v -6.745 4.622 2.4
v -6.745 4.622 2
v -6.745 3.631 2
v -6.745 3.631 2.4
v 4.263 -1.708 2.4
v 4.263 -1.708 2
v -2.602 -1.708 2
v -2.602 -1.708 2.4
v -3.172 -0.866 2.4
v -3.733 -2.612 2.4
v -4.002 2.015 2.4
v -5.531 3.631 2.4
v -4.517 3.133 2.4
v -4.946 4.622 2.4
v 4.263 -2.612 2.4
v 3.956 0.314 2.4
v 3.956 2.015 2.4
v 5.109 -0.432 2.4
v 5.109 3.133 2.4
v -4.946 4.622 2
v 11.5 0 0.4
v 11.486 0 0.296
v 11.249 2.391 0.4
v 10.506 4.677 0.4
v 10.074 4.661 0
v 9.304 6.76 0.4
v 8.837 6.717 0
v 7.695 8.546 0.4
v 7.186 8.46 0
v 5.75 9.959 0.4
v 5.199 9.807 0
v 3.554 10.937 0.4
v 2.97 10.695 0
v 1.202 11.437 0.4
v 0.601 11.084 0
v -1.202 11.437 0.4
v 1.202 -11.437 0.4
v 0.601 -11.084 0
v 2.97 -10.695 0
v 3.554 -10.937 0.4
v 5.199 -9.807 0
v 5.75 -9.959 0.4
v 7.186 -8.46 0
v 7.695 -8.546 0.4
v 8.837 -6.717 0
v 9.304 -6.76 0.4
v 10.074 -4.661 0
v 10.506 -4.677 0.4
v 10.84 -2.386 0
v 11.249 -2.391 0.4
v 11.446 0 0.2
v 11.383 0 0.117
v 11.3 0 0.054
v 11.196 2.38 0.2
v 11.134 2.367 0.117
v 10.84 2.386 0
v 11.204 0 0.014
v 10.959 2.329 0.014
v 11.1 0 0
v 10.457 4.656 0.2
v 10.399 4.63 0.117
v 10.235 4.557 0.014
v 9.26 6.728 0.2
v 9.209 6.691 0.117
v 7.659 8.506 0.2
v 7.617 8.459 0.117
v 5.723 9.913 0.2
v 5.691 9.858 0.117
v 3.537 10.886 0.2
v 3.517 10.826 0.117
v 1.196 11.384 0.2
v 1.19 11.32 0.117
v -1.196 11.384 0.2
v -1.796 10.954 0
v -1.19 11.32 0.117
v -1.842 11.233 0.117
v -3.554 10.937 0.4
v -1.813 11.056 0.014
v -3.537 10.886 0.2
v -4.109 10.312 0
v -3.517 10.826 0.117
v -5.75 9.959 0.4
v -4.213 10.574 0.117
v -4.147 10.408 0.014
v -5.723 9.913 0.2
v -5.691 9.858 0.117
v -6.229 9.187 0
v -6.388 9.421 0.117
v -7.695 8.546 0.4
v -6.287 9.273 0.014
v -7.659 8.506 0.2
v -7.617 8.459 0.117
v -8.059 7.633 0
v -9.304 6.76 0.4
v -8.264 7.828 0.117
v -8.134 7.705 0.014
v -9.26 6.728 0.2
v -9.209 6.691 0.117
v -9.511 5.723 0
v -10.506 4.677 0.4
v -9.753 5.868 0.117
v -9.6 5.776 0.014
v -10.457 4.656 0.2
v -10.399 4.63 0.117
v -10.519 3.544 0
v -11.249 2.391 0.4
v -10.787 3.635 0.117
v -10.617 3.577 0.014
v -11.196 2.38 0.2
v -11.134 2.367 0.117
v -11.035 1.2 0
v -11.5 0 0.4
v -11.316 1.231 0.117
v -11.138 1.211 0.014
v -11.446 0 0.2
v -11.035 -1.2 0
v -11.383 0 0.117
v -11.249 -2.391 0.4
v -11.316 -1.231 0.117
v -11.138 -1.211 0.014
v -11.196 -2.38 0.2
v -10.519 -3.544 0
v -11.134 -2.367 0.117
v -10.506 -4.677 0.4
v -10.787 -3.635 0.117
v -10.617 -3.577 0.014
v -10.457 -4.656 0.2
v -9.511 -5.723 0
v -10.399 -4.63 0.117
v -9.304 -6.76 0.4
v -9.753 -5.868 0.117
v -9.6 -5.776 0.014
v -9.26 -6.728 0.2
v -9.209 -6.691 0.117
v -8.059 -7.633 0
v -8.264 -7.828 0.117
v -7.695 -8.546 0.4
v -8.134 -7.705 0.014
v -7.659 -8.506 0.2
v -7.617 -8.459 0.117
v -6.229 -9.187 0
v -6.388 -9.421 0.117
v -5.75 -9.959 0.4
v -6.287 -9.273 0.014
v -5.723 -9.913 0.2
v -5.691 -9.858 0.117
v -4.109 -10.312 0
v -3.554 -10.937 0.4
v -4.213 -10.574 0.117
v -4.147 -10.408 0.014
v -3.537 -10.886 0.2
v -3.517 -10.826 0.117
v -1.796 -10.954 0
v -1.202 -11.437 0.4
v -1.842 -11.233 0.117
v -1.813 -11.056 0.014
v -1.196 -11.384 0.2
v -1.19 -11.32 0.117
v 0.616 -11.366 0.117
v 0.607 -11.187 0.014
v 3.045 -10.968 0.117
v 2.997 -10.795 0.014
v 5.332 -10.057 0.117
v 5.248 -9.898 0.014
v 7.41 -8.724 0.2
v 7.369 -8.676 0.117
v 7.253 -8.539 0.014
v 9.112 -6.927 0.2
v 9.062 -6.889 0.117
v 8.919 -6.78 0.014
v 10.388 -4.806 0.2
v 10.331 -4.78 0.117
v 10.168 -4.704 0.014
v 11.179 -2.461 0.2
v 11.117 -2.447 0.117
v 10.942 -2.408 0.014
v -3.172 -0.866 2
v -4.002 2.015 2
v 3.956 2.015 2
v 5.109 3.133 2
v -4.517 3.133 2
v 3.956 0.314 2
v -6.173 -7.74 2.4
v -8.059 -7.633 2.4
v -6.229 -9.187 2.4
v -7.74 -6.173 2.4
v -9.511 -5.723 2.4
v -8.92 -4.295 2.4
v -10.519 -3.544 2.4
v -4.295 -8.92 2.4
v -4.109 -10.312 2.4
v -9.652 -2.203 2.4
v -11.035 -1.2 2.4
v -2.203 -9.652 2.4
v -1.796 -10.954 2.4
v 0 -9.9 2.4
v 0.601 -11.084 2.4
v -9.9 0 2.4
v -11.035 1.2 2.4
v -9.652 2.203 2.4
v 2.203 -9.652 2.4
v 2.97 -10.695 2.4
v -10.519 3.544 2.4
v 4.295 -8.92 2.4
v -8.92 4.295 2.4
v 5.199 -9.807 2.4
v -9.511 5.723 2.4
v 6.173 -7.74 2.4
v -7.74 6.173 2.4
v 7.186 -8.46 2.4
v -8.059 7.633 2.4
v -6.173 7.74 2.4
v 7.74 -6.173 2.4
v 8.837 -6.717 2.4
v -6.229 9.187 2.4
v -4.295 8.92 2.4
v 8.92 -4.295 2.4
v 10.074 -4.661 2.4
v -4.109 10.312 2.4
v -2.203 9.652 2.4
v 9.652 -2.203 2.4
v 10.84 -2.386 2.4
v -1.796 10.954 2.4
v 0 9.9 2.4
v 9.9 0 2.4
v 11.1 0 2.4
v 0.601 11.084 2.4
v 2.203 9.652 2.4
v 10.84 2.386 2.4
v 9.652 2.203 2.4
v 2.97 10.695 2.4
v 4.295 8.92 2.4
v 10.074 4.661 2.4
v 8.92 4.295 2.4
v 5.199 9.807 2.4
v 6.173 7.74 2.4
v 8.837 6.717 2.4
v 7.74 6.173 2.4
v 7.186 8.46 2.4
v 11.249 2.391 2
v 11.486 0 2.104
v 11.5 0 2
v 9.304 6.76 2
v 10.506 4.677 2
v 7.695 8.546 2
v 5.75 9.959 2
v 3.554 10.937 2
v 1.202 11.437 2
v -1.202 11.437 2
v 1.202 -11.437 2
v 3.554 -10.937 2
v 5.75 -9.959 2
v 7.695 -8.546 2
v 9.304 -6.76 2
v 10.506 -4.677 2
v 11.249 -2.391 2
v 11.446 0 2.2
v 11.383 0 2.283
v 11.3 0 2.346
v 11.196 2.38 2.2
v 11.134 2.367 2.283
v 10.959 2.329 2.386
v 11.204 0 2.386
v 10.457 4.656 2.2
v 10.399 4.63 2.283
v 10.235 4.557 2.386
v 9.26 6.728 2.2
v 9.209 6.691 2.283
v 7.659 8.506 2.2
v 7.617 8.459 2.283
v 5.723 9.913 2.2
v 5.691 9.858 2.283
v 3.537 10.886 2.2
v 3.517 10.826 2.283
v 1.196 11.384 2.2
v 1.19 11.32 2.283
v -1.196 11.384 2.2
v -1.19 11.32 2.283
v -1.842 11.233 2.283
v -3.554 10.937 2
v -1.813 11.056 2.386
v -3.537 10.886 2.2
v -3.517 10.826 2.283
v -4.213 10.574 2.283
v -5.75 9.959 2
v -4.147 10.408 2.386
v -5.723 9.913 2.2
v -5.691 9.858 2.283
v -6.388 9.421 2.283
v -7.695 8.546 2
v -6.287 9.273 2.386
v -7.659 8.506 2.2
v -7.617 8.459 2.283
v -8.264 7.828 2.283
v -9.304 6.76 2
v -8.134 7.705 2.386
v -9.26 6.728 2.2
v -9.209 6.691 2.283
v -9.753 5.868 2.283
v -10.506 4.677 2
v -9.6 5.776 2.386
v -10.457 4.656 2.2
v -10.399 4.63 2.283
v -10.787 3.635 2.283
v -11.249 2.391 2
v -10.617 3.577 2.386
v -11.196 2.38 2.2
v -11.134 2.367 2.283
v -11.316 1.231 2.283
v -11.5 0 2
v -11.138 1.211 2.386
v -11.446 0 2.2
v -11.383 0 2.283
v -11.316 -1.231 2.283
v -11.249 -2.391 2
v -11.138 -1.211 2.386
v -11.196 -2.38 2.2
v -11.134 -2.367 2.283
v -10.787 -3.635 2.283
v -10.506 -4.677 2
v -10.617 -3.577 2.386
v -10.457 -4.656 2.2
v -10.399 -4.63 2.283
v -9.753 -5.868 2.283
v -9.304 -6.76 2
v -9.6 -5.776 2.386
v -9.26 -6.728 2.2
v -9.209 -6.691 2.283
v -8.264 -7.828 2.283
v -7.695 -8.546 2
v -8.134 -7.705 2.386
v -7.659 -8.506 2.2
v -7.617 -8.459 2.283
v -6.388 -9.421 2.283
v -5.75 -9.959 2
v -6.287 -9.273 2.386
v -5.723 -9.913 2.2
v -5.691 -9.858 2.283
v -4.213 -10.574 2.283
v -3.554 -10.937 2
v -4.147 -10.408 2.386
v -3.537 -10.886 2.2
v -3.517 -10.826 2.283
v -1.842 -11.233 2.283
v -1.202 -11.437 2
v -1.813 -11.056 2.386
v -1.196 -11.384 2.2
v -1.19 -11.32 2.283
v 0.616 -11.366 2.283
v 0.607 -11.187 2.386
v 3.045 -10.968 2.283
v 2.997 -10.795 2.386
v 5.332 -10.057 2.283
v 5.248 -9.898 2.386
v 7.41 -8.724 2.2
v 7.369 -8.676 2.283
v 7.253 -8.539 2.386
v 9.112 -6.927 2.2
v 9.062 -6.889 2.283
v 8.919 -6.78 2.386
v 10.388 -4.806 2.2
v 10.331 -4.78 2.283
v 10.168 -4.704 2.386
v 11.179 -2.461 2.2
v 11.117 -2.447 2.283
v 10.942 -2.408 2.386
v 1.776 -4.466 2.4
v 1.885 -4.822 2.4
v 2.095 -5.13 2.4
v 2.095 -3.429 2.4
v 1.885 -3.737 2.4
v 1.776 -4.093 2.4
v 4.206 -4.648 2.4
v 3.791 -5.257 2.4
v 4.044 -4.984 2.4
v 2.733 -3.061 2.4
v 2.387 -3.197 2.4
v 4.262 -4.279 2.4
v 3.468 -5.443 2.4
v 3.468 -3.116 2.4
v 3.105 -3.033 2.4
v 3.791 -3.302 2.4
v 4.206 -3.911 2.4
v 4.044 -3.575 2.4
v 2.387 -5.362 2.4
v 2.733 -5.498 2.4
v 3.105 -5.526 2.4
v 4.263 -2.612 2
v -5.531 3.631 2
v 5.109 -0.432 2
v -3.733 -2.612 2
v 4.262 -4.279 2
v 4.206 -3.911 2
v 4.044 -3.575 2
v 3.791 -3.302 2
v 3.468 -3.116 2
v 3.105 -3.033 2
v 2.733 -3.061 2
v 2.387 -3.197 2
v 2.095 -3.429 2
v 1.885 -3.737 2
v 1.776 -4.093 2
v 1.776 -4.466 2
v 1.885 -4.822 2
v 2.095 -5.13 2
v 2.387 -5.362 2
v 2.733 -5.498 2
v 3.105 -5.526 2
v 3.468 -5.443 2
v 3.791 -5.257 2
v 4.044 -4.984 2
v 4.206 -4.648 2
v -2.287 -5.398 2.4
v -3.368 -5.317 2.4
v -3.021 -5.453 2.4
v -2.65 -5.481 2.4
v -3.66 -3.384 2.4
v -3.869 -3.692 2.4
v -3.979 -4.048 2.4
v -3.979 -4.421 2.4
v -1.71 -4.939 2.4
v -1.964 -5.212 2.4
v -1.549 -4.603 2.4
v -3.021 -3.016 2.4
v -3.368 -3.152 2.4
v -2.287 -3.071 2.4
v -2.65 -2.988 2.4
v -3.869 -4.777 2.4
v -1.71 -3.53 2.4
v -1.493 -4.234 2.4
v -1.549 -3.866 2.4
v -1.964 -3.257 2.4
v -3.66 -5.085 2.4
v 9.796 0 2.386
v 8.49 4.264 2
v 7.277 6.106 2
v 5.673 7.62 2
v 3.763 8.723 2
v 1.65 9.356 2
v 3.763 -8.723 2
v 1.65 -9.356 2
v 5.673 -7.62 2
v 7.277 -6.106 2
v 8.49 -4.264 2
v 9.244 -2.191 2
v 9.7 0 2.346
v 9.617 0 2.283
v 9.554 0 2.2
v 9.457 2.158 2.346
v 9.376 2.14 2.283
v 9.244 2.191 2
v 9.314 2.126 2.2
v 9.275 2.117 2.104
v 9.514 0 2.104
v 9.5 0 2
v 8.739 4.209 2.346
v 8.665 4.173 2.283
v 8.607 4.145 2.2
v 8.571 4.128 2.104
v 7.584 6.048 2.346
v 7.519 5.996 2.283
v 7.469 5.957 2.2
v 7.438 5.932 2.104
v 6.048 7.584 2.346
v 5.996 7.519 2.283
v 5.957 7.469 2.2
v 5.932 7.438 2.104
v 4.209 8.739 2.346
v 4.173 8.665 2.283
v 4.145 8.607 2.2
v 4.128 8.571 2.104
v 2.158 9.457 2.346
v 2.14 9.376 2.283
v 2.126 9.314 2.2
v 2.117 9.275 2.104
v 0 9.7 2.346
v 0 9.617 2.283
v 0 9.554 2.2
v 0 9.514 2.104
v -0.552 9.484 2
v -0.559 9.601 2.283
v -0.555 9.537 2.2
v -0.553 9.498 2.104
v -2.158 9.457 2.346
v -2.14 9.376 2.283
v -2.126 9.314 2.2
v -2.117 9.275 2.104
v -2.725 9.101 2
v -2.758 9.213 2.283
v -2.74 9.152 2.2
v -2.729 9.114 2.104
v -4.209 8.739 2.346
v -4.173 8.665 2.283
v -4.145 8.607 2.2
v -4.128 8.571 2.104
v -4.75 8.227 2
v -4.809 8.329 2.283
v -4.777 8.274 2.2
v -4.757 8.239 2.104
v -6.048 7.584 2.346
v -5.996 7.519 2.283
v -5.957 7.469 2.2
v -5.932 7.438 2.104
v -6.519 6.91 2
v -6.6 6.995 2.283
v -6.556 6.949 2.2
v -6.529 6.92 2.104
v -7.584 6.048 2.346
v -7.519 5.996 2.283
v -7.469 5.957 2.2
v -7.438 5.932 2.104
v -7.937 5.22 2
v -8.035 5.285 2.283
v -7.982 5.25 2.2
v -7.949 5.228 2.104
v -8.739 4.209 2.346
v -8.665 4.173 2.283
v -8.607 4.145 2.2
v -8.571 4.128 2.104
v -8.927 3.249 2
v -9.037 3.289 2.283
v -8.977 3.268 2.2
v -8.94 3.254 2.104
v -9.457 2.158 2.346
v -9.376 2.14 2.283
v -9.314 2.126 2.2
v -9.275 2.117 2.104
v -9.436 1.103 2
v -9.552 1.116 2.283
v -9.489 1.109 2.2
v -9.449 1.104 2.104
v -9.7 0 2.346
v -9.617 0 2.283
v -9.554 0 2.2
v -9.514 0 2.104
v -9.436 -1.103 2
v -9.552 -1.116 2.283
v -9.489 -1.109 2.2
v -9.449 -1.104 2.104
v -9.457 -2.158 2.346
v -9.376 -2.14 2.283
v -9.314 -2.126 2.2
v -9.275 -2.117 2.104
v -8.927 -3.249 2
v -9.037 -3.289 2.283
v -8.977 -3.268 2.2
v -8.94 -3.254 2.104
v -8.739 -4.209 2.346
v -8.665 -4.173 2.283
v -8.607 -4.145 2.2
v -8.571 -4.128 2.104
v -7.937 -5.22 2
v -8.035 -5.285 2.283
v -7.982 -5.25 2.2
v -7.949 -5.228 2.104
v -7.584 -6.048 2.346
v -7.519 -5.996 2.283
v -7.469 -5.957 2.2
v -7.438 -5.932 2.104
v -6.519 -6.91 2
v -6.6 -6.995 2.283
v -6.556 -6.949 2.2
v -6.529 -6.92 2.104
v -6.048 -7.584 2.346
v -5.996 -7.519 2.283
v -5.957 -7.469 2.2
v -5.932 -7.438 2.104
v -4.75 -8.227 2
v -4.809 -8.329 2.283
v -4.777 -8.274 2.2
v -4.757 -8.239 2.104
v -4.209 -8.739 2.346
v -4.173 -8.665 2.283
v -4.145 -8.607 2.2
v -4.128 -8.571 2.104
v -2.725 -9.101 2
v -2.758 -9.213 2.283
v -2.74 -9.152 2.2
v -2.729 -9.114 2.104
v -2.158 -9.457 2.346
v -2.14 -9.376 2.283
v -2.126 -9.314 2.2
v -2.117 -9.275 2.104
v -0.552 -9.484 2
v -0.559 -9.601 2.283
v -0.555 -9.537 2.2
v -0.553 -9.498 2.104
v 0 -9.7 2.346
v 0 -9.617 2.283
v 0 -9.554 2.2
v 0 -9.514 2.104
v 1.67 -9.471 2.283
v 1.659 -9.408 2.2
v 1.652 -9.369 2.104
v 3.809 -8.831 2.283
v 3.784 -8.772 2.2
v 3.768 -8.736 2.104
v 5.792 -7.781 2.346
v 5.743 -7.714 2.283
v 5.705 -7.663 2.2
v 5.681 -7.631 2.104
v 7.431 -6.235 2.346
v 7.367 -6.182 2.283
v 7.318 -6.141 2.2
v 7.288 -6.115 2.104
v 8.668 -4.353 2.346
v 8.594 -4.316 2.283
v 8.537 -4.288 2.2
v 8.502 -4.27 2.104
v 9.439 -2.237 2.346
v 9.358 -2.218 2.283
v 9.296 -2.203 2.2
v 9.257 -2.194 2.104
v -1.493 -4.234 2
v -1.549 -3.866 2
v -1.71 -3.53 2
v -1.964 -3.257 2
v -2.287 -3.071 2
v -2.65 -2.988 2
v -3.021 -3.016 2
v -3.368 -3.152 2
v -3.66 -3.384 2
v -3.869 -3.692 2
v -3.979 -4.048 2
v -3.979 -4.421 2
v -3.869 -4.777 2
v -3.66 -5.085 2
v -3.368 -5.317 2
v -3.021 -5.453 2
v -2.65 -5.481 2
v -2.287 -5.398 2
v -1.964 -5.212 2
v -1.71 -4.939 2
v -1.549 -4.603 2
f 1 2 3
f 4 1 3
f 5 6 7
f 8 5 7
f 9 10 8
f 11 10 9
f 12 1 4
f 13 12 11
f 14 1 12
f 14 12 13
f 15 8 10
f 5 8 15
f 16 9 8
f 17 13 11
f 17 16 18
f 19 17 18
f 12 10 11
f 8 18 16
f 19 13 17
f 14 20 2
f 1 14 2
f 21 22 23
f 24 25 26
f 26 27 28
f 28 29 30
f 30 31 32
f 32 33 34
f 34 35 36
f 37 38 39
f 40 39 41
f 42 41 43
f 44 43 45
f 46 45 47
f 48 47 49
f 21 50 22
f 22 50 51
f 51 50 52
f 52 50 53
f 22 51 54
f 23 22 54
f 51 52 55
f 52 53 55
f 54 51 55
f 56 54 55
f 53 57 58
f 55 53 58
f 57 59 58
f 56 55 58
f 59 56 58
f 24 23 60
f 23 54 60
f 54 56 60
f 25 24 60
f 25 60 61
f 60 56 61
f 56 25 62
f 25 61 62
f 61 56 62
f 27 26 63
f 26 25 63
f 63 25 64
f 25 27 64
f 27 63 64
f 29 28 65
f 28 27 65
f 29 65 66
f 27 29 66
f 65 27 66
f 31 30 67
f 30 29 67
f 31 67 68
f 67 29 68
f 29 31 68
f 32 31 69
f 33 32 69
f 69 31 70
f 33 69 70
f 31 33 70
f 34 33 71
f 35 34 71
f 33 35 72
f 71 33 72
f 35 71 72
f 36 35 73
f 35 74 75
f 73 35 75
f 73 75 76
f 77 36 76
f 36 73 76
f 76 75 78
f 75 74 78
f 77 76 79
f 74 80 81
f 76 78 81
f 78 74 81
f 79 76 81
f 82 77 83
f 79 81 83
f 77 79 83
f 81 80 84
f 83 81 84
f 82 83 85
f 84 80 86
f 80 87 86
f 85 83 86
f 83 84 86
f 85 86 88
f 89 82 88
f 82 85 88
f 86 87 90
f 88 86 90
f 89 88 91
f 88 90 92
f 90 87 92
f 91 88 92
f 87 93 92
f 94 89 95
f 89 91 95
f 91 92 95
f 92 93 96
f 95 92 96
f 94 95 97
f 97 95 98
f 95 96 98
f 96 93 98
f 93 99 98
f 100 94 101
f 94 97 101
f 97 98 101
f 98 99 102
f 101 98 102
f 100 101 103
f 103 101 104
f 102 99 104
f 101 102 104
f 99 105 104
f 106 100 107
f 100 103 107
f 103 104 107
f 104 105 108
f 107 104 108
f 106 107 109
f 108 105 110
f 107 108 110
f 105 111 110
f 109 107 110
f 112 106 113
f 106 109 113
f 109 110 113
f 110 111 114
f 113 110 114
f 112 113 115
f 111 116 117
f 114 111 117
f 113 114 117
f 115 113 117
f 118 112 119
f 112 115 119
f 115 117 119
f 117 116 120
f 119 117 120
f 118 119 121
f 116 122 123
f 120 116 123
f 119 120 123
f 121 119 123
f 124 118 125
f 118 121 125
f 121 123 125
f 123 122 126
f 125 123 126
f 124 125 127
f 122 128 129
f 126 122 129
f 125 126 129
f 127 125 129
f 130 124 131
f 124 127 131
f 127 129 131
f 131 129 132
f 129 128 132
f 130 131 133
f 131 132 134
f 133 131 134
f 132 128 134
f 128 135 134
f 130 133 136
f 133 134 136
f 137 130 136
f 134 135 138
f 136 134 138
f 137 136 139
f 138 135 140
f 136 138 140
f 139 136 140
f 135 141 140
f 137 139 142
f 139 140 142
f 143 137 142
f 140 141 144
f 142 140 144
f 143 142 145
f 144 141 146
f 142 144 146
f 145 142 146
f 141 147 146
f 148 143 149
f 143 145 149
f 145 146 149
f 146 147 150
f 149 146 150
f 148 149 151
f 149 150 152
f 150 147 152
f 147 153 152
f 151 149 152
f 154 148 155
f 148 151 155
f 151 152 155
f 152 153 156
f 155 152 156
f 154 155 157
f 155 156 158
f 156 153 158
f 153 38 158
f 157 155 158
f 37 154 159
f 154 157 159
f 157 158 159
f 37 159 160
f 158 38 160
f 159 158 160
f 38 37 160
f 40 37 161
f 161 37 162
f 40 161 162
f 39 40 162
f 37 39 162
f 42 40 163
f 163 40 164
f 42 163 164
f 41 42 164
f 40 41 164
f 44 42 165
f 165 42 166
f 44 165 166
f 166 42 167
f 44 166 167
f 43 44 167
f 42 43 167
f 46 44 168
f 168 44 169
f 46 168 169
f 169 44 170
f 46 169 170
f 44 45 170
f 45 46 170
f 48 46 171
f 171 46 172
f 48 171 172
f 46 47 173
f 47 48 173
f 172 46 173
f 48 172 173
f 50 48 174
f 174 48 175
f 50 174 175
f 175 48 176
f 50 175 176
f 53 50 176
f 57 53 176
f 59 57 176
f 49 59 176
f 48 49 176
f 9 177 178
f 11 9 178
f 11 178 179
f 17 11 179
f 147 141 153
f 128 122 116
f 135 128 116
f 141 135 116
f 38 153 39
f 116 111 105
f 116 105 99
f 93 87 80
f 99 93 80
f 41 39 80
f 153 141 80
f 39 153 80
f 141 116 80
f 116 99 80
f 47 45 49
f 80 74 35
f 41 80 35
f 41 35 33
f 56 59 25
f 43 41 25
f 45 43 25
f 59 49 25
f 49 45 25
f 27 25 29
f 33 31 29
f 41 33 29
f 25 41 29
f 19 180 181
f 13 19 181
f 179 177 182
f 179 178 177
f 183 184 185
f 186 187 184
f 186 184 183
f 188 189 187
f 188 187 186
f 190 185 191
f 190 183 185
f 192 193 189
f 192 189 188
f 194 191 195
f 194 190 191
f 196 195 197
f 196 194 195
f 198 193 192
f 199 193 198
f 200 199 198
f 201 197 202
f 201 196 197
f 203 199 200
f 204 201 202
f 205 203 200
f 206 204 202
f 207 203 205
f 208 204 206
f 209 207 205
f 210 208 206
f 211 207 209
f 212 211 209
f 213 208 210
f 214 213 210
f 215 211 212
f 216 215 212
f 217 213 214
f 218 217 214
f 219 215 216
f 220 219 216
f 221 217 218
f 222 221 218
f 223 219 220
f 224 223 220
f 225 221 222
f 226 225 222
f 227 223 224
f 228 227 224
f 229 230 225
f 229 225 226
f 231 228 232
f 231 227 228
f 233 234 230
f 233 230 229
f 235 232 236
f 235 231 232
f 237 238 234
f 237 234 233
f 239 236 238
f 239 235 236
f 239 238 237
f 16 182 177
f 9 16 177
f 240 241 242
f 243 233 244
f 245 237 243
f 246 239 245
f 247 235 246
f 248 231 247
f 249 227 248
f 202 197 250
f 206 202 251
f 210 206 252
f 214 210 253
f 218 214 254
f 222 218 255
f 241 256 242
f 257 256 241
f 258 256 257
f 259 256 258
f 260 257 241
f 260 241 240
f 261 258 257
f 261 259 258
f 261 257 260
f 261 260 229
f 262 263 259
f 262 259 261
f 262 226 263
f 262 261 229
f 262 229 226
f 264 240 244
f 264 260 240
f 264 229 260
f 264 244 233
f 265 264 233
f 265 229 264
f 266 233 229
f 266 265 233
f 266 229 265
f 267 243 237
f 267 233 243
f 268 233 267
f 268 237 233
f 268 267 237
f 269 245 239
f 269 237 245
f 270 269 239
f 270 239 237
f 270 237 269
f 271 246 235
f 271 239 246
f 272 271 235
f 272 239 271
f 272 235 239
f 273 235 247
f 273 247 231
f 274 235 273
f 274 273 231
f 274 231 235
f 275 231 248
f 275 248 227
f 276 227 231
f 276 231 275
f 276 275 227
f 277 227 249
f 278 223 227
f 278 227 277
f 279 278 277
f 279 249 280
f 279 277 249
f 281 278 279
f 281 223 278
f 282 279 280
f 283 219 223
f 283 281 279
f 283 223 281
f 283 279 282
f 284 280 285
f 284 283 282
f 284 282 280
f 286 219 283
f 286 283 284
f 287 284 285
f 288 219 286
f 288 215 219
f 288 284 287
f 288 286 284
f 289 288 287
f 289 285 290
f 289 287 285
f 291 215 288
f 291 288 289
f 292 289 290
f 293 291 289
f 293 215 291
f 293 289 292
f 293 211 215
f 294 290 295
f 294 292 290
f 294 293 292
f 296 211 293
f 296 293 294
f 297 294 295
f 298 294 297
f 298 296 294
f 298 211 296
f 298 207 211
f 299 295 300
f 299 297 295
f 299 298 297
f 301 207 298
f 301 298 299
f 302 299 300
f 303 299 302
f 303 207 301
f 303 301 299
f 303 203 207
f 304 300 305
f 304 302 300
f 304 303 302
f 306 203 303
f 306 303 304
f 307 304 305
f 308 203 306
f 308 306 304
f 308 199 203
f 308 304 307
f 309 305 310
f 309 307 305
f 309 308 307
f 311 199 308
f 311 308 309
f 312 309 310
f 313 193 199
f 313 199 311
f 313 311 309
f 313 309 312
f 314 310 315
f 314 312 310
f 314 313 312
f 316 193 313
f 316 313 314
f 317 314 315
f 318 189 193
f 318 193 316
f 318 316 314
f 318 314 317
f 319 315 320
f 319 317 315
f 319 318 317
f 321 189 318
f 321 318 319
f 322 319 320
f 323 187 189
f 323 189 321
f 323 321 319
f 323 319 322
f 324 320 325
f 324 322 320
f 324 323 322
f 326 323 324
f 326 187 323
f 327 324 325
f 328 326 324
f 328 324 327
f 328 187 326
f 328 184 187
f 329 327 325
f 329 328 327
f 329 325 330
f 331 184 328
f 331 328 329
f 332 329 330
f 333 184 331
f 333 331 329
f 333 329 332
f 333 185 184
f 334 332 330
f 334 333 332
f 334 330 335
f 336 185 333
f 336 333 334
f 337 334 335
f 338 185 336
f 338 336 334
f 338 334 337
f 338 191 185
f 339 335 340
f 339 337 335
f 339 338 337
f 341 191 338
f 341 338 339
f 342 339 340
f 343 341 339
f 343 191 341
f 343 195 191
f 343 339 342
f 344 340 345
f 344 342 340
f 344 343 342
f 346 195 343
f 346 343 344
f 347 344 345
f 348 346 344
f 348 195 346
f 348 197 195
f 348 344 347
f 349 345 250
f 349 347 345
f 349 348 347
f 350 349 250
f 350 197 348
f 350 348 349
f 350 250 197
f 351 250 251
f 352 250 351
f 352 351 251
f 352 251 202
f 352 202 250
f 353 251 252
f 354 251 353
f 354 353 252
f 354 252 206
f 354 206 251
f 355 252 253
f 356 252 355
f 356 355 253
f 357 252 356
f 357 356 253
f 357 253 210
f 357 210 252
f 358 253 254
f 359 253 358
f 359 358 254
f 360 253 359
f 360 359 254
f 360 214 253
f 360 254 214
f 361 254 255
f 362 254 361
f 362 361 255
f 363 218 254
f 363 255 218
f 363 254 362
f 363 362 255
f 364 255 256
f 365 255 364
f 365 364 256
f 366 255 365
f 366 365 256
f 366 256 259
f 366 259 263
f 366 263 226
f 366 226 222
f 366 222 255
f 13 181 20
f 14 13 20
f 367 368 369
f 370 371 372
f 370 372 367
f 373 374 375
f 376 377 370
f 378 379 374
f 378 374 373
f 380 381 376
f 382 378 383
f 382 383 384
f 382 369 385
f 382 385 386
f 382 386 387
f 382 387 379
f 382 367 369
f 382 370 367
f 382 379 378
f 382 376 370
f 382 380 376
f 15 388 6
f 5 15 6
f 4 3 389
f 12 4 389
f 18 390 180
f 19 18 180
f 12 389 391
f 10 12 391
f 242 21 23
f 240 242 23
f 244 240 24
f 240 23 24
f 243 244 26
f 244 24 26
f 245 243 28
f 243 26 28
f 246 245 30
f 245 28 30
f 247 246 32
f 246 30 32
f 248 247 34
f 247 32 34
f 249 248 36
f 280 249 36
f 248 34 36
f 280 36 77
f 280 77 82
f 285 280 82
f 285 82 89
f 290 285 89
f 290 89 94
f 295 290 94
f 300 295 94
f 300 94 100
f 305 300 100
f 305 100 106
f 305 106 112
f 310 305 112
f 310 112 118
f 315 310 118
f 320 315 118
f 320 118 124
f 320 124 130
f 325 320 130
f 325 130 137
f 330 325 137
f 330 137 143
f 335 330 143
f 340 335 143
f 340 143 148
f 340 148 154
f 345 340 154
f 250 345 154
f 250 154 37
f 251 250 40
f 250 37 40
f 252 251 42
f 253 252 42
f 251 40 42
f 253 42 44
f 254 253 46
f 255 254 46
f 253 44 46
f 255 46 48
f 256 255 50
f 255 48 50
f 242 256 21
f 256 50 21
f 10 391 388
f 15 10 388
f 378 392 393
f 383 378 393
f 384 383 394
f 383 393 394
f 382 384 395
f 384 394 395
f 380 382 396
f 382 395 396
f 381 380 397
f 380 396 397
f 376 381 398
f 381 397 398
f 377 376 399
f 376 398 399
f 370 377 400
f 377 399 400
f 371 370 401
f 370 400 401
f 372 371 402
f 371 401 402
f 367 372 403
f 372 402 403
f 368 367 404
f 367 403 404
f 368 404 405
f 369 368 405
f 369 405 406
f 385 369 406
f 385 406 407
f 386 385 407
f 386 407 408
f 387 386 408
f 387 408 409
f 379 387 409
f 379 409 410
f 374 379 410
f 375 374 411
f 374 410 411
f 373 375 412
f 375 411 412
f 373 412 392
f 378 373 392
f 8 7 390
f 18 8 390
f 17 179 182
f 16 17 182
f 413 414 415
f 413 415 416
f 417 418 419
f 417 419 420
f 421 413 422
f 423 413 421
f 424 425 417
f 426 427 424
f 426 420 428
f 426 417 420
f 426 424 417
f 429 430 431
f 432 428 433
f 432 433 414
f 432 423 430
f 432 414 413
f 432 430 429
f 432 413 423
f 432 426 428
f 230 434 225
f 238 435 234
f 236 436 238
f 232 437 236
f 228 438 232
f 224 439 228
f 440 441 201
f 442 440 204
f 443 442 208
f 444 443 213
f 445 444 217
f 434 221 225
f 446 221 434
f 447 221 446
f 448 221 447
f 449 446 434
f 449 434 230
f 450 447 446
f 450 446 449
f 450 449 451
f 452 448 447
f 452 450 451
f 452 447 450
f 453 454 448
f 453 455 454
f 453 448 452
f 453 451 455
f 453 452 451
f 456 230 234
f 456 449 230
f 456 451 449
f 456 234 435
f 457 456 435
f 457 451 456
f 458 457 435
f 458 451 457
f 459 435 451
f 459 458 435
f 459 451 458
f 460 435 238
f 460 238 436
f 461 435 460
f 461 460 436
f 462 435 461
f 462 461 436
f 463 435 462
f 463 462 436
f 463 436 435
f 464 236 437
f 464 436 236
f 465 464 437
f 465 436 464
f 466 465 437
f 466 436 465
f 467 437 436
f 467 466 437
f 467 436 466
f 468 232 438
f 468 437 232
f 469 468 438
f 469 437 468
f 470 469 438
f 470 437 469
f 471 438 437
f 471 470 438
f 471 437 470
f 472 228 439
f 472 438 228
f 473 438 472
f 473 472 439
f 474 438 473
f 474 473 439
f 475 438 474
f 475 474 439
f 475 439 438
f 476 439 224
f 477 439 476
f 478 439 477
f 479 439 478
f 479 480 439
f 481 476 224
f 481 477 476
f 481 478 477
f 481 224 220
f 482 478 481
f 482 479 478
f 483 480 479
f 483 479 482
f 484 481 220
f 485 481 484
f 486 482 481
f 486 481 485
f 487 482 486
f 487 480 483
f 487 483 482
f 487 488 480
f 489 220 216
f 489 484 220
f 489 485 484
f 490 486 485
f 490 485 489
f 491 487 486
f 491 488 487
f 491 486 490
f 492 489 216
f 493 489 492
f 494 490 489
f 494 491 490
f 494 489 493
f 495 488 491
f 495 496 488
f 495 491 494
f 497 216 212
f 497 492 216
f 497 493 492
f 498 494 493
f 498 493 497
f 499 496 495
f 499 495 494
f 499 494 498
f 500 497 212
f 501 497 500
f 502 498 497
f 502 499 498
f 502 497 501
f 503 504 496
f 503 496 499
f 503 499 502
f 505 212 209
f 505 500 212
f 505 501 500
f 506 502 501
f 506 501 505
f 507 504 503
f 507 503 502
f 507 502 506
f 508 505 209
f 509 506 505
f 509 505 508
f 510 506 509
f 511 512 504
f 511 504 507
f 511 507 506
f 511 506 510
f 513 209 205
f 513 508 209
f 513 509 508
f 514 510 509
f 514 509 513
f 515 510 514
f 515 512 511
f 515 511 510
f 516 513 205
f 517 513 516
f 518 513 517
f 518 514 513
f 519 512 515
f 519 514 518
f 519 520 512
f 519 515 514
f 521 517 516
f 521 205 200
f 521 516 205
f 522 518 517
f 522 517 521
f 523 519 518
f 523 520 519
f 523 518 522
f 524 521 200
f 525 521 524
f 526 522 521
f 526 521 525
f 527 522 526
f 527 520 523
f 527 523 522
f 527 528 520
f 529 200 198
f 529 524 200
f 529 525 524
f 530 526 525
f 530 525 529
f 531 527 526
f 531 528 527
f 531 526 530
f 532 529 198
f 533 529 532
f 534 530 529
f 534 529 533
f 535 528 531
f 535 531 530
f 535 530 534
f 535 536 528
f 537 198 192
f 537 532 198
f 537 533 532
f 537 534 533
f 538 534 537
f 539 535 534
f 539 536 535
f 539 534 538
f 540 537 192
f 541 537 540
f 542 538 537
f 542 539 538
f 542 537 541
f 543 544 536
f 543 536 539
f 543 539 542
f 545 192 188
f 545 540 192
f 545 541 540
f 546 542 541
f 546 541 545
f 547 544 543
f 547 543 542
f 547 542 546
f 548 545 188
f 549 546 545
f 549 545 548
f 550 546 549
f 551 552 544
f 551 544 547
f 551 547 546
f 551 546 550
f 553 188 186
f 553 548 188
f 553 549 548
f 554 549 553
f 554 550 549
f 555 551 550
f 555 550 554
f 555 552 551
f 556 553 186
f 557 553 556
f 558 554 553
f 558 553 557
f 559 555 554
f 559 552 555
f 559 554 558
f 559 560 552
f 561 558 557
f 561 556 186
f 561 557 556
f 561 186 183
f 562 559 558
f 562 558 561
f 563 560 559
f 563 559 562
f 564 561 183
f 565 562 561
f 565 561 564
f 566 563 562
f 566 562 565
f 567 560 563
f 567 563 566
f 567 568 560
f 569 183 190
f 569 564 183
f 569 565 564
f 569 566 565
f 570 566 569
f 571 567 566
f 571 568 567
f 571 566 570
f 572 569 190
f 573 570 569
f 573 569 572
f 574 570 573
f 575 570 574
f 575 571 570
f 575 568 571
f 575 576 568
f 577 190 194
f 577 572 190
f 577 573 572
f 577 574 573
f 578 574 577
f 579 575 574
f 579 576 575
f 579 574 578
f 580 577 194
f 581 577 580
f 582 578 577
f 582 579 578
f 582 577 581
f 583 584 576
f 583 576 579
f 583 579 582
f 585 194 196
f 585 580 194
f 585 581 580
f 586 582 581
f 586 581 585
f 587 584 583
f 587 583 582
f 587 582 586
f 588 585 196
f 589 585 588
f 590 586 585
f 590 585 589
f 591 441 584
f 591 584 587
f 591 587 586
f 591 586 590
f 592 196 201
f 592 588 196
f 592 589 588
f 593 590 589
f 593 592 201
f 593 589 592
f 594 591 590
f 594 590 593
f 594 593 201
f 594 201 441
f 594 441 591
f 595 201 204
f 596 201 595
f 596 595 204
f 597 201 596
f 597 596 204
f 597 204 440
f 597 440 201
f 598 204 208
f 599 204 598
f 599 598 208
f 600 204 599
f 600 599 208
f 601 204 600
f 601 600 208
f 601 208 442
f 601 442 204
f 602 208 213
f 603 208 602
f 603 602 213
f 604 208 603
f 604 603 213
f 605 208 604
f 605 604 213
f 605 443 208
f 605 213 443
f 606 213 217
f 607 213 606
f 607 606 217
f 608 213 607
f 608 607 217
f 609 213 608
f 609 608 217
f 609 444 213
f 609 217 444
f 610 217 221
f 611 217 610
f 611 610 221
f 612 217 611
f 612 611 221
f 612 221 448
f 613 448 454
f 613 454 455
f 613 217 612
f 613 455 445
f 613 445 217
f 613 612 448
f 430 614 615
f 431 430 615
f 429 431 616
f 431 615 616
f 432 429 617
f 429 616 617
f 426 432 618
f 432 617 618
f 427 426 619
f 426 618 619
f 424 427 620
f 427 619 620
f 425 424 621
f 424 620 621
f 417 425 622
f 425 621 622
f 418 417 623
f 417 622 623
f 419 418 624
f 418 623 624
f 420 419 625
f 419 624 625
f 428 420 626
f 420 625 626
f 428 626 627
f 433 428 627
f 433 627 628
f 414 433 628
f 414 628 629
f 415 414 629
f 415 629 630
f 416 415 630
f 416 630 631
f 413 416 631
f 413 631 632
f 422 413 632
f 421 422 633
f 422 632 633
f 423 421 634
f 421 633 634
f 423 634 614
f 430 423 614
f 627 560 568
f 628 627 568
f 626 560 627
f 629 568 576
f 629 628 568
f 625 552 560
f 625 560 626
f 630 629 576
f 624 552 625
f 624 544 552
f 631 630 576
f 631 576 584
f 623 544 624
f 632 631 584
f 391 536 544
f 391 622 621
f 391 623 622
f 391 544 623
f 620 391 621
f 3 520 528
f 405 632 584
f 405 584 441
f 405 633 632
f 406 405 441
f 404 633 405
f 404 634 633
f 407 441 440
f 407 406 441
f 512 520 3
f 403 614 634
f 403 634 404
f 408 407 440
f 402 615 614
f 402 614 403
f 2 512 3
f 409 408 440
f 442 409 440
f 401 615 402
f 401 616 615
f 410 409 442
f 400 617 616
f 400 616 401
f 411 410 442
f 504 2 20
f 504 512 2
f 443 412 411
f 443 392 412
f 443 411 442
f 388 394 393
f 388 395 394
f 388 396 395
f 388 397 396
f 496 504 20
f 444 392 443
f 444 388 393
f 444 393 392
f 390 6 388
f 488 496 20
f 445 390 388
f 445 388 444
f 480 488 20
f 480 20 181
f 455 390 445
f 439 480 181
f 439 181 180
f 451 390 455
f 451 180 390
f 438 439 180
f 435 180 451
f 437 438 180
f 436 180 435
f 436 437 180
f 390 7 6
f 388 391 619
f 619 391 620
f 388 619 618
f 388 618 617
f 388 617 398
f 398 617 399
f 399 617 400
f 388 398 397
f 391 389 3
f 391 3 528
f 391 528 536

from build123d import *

# Parameters (mm, degrees)
F0_R     = 11.5
F1_DEPTH = 2
F2_R     = 11.5
F2_R_2   = 9.5
F3_DEPTH = 0.4
F4_R     = 1.25
F5_DEPTH = 0.4
F6_R     = 0.39999


# Not quite as in the source:
# - a fillet or chamfer is up to 0.001 mm smaller than in the source, because OpenCascade refuses the exact size


with BuildPart() as f1:
    # F0 (on Top) → F1 (new body)
    with BuildSketch(Plane.XY):
        Circle(F0_R)
    extrude(amount=F1_DEPTH)

    # F2 (on face) → F3 (join)
    with BuildSketch(Plane.XY.offset(2)):
        Circle(F2_R)
        Circle(F2_R_2, mode=Mode.SUBTRACT)
    extrude(amount=F3_DEPTH)

    # F4 (on face) → F5 (join)
    with BuildSketch(Plane.XY.offset(2)):
        Polygon((-4.9462847407, 4.6223603384), (-6.7446869929, 4.6223603384), (-6.7446869929, 3.631329312), (-5.5307656769, 3.631329312), (-3.7330235863, -2.611553217), (4.2630984261, -2.611553217), (4.2630984261, -1.7084874132), (-2.6016419292, -1.7084874132), (5.1088749777, -0.4323172916), (5.1088749777, 3.1326496529), (-4.5172977159, 3.1326496529), align=None)
        Polygon((-3.1724679652, -0.8662961763), (-4.0021237171, 2.0147863915), (3.9558067254, 2.0147863915), (3.9558067254, 0.3135068497), align=None, mode=Mode.SUBTRACT)
        with Locations((-2.7432420498, -4.2344009733)):
            Circle(F4_R)
        with Locations((3.0116447943, -4.2793590558)):
            Circle(F4_R)
    extrude(amount=F5_DEPTH)

    # F6 (radius 0.4 in the source; OpenCascade refuses exactly that, so slightly less here)
    f6_edges = [f1.edges().sort_by_distance(p)[0] for p in [
        (-11.5, 0, 2.4),
        (-9.5, 0, 2.4),
        (-11.5, 0, 0),
    ]]
    fillet(f6_edges, radius=F6_R)


solid = f1.part
